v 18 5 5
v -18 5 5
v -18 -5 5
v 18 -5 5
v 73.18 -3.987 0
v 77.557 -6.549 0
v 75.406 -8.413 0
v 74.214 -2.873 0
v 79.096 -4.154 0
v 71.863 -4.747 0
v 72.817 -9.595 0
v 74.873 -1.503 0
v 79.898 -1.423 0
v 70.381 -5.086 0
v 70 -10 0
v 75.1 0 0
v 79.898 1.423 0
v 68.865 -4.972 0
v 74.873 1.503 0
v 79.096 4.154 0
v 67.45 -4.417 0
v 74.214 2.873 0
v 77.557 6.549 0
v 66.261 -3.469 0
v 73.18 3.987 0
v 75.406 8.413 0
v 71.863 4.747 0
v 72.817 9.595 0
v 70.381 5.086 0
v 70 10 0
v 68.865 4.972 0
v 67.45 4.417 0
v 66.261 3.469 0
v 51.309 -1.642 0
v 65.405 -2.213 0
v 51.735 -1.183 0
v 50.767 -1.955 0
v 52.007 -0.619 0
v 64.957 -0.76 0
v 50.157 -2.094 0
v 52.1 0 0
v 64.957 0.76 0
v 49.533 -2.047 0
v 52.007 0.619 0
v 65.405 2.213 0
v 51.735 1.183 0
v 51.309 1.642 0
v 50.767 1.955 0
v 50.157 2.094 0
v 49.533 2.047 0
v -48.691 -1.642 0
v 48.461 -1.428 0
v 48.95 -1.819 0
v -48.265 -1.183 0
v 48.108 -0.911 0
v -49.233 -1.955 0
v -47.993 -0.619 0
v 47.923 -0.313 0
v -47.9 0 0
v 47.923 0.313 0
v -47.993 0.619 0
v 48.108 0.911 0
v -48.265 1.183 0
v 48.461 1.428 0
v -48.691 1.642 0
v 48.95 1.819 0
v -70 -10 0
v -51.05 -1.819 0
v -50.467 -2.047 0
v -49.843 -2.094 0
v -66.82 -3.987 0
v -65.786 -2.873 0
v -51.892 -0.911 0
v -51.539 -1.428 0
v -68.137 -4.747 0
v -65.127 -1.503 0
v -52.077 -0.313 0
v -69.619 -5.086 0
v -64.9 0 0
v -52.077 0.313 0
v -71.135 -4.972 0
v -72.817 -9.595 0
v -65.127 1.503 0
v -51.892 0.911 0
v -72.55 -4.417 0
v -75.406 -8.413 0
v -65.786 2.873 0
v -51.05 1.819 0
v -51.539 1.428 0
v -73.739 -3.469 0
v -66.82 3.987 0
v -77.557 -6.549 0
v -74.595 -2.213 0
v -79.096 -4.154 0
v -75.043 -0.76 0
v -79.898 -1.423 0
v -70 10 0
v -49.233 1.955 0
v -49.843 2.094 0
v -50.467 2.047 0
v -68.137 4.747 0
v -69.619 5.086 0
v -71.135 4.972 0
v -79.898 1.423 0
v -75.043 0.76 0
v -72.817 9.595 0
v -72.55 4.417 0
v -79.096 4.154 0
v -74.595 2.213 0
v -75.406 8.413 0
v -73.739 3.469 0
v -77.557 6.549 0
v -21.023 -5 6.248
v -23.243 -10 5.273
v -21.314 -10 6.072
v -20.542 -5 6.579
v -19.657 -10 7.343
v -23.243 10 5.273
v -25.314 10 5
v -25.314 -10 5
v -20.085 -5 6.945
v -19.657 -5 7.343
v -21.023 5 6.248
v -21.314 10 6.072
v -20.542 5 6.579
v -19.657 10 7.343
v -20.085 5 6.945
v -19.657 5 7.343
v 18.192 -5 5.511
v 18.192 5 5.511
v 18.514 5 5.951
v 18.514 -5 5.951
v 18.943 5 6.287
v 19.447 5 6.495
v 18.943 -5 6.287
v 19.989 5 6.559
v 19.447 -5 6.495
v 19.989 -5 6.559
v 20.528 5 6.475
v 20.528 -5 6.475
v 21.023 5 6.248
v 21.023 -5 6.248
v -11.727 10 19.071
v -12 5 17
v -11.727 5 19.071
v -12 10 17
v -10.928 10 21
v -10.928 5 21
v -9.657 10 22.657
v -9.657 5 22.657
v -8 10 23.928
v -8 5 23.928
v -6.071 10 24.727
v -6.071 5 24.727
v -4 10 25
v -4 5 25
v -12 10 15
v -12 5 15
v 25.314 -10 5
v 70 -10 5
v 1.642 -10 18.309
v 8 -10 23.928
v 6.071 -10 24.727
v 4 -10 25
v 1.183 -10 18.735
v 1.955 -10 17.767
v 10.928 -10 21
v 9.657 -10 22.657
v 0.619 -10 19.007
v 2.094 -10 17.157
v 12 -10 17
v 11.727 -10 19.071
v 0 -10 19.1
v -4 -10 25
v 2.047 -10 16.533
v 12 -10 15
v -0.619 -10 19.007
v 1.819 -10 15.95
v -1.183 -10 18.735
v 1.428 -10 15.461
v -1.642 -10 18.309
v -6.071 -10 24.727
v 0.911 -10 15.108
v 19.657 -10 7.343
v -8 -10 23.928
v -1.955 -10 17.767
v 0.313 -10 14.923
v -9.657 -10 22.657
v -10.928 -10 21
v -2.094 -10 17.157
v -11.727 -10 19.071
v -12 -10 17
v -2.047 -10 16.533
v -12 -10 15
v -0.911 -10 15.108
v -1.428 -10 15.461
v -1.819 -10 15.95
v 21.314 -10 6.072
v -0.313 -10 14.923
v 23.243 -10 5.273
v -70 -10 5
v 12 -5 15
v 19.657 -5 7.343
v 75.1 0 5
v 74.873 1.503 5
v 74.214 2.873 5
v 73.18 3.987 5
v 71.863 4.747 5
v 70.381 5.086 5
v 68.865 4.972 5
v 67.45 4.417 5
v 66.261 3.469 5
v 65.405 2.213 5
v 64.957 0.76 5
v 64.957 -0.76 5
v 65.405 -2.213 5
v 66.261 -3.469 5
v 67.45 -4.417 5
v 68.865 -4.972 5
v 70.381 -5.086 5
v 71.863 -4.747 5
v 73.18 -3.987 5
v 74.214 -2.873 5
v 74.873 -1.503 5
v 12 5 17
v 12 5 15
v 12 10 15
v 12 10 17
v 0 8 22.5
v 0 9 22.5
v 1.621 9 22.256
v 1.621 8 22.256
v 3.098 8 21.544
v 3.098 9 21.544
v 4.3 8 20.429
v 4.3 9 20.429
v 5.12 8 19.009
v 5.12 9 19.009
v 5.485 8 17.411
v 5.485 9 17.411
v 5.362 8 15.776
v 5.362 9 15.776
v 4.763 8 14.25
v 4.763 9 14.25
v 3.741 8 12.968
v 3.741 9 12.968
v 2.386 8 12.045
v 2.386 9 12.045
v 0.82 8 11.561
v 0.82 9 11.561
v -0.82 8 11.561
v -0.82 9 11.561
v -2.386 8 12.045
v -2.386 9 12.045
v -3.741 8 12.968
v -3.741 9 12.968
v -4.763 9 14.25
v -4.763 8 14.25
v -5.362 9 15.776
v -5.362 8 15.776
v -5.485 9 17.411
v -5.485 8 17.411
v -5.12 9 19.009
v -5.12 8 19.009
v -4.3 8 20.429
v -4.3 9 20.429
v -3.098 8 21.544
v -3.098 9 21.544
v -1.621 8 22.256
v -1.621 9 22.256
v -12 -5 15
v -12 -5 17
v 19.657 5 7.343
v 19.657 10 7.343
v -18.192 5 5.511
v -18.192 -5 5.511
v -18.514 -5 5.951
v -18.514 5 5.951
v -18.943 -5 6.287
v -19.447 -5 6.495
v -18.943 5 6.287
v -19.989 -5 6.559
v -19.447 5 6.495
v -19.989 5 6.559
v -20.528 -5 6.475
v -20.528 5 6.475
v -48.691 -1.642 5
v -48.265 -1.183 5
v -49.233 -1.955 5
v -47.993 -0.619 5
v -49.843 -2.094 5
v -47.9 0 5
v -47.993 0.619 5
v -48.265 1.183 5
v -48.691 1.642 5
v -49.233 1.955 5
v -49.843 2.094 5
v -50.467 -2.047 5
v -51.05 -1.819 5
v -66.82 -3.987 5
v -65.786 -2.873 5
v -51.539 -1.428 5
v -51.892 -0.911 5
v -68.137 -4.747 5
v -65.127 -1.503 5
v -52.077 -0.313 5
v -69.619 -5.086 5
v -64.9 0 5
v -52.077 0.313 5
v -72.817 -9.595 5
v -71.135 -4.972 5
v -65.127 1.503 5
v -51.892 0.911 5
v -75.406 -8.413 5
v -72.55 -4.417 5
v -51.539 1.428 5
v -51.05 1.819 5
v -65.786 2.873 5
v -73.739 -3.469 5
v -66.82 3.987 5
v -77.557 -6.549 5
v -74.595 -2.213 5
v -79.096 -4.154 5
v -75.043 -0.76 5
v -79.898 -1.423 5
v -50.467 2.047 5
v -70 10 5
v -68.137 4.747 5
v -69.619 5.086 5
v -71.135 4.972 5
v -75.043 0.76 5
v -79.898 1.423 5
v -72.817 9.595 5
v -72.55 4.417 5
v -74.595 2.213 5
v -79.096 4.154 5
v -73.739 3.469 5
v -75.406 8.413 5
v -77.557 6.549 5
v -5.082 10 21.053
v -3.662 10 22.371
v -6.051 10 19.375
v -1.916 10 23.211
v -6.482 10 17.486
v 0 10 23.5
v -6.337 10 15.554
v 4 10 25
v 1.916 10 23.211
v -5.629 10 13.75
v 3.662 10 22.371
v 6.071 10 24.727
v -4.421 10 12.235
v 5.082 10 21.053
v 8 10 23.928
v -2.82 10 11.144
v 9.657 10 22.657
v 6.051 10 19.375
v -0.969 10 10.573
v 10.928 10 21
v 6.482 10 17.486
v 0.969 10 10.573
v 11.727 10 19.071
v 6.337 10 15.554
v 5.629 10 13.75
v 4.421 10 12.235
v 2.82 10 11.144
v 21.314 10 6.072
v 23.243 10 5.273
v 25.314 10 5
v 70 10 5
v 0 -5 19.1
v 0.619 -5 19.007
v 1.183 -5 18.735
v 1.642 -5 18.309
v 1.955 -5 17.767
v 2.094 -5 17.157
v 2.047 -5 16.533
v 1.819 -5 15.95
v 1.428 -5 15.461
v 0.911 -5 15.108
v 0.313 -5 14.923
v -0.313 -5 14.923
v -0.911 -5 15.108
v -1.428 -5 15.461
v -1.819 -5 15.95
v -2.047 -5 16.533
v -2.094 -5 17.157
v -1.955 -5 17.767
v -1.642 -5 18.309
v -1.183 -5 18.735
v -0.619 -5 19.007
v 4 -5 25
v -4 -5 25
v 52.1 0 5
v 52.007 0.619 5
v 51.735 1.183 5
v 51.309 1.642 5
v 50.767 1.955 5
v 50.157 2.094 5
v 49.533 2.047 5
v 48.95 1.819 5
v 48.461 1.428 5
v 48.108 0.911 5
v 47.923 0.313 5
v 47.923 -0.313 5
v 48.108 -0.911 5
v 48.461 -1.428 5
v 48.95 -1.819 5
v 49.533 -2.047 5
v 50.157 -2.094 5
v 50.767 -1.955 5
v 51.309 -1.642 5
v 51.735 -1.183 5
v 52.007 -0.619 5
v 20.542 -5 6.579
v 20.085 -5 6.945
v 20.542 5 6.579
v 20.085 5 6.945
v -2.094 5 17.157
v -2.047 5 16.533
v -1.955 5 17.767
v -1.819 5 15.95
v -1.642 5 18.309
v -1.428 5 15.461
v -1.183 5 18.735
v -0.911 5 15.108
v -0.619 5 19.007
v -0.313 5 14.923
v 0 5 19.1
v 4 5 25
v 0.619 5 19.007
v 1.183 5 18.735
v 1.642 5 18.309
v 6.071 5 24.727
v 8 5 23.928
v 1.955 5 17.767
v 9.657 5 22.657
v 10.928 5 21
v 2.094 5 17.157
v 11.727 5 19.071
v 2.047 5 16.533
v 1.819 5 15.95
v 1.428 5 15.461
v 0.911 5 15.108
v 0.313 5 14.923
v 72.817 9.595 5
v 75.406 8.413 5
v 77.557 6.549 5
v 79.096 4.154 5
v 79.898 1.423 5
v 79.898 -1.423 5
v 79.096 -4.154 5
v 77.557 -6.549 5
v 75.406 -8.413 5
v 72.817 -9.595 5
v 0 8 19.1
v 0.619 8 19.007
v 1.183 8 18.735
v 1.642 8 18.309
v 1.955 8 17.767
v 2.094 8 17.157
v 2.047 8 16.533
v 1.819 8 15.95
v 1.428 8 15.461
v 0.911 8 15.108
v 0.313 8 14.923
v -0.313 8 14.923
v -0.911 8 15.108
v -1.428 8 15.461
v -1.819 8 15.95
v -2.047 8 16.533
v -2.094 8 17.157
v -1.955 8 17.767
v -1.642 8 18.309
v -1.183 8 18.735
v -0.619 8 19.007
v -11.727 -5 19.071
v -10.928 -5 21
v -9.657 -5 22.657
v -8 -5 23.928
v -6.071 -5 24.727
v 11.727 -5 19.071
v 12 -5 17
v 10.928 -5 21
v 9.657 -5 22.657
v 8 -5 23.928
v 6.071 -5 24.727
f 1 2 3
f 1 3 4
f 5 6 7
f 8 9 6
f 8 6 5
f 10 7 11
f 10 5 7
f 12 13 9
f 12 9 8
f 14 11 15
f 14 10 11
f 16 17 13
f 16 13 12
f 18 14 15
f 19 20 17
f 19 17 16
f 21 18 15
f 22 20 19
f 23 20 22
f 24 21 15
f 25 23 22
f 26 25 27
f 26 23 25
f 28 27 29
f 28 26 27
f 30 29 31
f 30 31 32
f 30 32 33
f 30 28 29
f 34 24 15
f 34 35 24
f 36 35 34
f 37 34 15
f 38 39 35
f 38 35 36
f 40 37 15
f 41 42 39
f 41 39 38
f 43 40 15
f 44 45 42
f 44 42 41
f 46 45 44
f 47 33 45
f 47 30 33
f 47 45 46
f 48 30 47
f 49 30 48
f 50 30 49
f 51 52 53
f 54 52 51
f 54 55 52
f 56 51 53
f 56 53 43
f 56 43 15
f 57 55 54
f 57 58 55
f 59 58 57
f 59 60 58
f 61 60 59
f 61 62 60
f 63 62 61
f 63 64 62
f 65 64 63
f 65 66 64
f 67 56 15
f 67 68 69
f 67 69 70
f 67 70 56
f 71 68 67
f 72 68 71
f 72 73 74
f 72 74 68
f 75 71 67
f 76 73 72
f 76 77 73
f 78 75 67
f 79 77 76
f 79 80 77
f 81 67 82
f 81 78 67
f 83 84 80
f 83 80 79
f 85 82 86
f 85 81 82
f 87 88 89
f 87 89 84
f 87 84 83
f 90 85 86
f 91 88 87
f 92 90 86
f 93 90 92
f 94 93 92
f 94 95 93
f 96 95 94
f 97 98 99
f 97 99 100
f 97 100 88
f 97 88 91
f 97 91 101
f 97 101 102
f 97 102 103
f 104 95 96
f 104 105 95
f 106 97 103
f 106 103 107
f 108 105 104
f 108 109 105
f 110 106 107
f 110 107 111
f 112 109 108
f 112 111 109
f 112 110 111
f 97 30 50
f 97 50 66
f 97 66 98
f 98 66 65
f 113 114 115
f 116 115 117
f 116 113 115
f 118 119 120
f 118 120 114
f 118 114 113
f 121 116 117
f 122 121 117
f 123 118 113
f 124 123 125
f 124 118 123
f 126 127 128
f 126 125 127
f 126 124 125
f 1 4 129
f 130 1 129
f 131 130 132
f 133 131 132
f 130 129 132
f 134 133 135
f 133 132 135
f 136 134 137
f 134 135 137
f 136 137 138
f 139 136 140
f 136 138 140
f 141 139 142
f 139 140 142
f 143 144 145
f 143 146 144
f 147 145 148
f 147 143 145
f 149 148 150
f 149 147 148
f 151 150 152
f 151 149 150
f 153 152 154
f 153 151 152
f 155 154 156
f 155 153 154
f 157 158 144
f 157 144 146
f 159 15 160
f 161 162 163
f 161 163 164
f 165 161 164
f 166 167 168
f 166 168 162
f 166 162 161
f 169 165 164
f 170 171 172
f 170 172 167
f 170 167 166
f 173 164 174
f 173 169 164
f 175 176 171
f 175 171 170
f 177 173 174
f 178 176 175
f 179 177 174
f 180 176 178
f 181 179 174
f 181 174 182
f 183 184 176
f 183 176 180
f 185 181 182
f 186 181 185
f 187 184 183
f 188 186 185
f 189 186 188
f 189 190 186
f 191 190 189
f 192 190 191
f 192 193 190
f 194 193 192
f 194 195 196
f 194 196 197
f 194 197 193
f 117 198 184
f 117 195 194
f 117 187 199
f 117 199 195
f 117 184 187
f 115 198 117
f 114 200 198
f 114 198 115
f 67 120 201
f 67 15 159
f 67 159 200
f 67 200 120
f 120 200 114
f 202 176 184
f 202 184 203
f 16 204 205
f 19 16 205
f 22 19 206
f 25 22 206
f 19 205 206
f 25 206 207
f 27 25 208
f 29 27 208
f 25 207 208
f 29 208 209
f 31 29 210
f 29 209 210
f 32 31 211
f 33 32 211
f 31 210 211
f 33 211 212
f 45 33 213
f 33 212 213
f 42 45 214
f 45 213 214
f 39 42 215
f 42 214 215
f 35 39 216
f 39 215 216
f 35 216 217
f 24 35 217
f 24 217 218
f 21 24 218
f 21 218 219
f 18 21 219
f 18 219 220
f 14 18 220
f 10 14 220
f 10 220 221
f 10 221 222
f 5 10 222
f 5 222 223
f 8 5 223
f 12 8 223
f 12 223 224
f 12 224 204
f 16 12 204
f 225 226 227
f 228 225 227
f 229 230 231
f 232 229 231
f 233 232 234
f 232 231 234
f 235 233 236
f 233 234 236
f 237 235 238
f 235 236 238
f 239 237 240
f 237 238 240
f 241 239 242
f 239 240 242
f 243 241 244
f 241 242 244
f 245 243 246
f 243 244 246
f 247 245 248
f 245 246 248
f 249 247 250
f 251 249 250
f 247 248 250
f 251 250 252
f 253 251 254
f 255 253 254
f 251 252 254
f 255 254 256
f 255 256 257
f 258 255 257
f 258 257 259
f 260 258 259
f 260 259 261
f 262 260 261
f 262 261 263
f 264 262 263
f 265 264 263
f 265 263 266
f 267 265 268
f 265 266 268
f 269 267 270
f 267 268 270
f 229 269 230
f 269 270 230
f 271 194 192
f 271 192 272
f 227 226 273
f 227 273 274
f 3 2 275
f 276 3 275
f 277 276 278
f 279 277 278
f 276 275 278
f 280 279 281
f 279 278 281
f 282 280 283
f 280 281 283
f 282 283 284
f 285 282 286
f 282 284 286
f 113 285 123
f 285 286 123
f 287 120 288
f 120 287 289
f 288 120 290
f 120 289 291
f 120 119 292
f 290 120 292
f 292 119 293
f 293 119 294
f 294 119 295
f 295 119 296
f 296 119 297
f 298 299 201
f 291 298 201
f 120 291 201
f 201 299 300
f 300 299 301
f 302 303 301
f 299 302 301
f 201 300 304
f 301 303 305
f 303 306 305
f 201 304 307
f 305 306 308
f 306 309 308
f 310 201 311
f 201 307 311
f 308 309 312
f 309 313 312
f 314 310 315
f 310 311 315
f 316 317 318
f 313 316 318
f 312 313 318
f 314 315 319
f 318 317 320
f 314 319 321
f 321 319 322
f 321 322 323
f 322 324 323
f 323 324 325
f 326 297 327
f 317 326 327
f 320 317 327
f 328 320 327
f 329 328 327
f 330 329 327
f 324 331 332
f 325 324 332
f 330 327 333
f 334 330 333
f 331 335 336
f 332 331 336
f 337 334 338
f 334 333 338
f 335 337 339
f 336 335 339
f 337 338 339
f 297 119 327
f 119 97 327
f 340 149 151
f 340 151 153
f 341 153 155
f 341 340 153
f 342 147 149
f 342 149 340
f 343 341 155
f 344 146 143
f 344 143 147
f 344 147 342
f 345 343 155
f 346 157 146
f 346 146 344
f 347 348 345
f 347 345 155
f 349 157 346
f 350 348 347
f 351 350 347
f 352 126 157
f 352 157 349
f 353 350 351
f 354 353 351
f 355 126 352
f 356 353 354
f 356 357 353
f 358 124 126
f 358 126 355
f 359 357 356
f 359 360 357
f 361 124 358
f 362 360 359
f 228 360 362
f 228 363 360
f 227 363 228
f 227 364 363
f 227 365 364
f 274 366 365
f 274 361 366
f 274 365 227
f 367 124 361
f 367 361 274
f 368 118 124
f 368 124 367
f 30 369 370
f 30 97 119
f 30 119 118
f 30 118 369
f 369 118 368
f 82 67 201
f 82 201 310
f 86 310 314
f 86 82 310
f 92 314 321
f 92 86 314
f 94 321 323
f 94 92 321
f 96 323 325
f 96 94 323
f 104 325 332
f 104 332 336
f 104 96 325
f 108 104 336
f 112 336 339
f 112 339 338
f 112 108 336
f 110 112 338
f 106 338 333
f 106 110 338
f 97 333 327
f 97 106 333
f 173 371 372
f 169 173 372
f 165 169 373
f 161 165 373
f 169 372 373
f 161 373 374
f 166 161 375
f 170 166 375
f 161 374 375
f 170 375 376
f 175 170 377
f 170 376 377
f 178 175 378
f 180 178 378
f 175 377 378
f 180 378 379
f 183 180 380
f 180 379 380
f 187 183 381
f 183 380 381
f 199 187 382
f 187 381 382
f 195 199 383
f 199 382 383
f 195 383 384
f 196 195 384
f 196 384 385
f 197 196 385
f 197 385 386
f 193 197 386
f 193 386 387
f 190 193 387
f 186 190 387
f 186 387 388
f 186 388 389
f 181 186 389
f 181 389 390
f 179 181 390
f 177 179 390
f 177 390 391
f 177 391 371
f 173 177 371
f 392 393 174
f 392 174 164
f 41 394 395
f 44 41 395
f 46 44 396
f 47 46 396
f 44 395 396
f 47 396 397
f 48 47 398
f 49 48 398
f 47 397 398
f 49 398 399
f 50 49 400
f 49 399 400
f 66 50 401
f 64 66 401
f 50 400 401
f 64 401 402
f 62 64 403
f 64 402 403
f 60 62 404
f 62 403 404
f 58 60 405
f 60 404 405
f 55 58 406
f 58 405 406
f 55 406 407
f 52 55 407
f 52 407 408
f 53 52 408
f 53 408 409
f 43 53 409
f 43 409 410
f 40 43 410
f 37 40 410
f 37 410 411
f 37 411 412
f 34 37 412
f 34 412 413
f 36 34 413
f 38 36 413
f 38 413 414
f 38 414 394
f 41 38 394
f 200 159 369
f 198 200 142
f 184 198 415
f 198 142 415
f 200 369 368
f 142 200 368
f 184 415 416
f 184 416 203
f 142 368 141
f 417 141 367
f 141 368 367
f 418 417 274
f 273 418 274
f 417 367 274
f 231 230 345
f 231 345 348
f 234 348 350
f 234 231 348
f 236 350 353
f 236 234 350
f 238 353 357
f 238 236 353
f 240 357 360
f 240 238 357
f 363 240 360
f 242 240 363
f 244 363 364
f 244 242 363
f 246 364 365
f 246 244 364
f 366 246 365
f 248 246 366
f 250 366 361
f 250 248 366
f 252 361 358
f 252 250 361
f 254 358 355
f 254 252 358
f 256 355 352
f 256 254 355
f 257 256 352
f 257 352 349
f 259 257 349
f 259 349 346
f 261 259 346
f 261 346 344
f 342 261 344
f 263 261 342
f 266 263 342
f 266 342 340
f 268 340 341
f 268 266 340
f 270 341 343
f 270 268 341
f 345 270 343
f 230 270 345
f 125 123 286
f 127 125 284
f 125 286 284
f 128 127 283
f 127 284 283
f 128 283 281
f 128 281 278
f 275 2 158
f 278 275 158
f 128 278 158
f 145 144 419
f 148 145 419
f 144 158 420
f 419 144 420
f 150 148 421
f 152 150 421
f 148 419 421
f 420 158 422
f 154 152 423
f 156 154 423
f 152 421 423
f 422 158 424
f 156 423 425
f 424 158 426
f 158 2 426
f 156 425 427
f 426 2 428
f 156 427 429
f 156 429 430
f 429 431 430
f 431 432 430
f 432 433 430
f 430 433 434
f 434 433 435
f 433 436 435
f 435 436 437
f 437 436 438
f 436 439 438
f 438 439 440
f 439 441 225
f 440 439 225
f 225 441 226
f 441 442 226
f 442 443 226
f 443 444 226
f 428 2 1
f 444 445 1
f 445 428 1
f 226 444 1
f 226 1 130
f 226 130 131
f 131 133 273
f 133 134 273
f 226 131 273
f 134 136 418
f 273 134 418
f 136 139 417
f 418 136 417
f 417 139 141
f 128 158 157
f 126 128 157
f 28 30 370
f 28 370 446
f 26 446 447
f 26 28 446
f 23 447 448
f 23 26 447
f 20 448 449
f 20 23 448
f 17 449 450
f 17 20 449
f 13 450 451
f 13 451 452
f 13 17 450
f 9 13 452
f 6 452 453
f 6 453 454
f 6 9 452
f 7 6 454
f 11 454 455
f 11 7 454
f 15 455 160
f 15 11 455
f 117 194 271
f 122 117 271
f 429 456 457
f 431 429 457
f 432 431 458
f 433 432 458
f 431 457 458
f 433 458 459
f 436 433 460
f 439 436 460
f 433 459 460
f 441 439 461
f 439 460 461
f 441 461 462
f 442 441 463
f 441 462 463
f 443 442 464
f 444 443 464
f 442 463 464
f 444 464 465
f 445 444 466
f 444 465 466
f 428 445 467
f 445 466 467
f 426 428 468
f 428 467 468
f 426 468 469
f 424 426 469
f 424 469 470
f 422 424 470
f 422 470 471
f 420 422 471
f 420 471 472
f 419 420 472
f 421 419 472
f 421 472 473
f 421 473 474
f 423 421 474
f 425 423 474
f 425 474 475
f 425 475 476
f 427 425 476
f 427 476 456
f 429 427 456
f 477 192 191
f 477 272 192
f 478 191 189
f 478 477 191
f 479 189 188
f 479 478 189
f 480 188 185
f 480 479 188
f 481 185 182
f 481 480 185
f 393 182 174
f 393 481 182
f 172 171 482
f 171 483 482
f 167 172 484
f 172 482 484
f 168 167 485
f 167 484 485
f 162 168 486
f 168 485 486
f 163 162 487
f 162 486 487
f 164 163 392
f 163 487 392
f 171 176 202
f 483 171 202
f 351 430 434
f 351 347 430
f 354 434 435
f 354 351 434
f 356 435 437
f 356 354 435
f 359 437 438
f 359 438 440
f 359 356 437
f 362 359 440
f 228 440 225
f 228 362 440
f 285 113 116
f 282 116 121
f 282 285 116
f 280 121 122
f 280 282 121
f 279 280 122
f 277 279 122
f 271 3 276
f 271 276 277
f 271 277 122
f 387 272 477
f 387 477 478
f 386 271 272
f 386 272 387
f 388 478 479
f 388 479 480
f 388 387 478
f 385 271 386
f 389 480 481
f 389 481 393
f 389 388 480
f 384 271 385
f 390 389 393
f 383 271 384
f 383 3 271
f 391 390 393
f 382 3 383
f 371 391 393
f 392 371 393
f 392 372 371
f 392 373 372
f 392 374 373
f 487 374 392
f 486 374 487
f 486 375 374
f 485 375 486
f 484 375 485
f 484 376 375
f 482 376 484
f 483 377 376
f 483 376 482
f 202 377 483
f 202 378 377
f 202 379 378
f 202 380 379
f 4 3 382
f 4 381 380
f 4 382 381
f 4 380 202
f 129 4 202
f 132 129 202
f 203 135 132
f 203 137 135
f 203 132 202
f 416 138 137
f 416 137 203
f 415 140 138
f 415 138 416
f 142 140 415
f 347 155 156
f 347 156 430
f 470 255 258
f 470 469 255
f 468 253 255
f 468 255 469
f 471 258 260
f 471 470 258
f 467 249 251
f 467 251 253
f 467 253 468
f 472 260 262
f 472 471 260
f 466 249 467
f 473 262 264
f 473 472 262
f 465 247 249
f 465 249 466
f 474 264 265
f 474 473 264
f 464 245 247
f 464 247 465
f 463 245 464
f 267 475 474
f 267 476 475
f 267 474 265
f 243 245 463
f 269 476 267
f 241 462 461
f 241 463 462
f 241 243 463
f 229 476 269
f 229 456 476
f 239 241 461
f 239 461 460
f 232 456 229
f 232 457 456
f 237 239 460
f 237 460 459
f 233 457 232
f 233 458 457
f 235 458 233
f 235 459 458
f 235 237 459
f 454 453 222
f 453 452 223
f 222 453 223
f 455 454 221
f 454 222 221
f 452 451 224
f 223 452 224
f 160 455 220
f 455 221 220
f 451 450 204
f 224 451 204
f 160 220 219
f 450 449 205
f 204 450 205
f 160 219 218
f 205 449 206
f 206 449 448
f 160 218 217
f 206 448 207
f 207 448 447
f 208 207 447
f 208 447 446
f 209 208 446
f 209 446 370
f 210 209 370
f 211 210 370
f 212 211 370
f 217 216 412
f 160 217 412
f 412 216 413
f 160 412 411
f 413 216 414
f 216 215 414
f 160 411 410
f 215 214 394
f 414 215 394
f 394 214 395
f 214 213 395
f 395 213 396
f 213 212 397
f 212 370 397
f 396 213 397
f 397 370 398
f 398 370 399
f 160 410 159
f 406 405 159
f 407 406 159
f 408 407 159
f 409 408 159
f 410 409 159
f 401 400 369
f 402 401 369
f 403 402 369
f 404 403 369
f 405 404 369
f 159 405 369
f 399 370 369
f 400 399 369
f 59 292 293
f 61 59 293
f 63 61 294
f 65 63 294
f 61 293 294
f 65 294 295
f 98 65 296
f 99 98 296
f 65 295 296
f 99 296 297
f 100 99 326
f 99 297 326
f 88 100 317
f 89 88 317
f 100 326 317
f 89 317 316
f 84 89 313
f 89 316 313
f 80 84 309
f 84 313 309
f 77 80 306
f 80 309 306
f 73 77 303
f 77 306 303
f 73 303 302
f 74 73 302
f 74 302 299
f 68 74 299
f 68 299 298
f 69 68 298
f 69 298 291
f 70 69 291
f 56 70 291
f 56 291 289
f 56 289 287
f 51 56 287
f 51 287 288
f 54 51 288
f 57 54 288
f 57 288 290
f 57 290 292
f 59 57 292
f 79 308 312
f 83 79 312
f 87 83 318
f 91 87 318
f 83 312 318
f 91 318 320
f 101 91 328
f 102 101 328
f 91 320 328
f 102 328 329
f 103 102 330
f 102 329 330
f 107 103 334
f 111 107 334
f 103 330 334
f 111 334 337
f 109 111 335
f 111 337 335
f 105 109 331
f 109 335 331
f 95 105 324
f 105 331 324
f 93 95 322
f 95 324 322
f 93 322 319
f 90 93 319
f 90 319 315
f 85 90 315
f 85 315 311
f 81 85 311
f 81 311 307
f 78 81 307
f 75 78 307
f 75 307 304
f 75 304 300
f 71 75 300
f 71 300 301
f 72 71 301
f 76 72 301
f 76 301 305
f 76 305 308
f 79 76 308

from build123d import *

# Parameters (mm, degrees)
BOSS_EXTRU_1_DEPTH      = 5
ESQUISSE2_R             = 5.1
ESQUISSE2_R_2           = 2.1
ENL_V_MAT_EXTRU_1_DEPTH = 81.777472107
ESQUISSE3_W             = 24
ESQUISSE3_H             = 20
BOSS_EXTRU_2_DEPTH      = 20
CHANFREIN1_SIZE         = 10
ESQUISSE4_W             = 36
ESQUISSE4_H             = 10
ENL_V_MAT_EXTRU_2_DEPTH = 20
ESQUISSE5_R             = 2.1
ENL_V_MAT_EXTRU_3_DEPTH = 87.168439698
CONG_1_R                = 8
ESQUISSE6_R             = 5.5
ENL_V_MAT_EXTRU_4_DEPTH = 2
CHANFREIN2_SIZE         = 1
CONG_4_R                = 2


with BuildPart() as part:
    # Esquisse1 → Boss.-Extru.1 (new body)
    with BuildSketch(Plane.XY):
        with BuildLine():
            Line((-70, 10), (70, 10))
            ThreePointArc((70, 10), (80, 0), (70, -10))
            Line((70, -10), (-70, -10))
            ThreePointArc((-70, -10), (-80, 0), (-70, 10))
        make_face()
    extrude(amount=BOSS_EXTRU_1_DEPTH)

    # Esquisse2 → Enlèv. mat.-Extru.1 (cut, through all)
    with BuildSketch(Plane.XY.offset(5)):
        with Locations((-70, 0)):
            Circle(ESQUISSE2_R)
        with Locations((70, 0)):
            Circle(ESQUISSE2_R)
        with Locations((-50, 0)):
            Circle(ESQUISSE2_R_2)
        with Locations((50, 0)):
            Circle(ESQUISSE2_R_2)
    extrude(amount=-ENL_V_MAT_EXTRU_1_DEPTH, mode=Mode.SUBTRACT)

    # Esquisse3 → Boss.-Extru.2 (add)
    with BuildSketch(Plane.XY.offset(5)):
        Rectangle(ESQUISSE3_W, ESQUISSE3_H)
    extrude(amount=BOSS_EXTRU_2_DEPTH)

    # Chanfrein1
    chanfrein1_edges = [part.edges().sort_by_distance(p)[0] for p in [
        (12, 0, 5),
        (-12, 0, 5),
    ]]
    chamfer(chanfrein1_edges, length=CHANFREIN1_SIZE)

    # Esquisse4 → Enlèv. mat.-Extru.2 (cut)
    with BuildSketch(Plane.XY.offset(25)):
        Rectangle(ESQUISSE4_W, ESQUISSE4_H)
    extrude(amount=-ENL_V_MAT_EXTRU_2_DEPTH, mode=Mode.SUBTRACT)

    # Esquisse5 → Enlèv. mat.-Extru.3 (cut, through all)
    with BuildSketch(Plane(origin=(0, 10, 0), x_dir=(1, 0, 0), z_dir=(0, 1, 0))):
        with Locations(Location((0, -17, 0), (0, 0, 270))):
            Circle(ESQUISSE5_R)
    extrude(amount=-ENL_V_MAT_EXTRU_3_DEPTH, mode=Mode.SUBTRACT)

    # Congé1
    cong_1_edges = [part.edges().sort_by_distance(p)[0] for p in [
        (-22, 0, 5),
        (-12, -7.5, 25),
        (12, -7.5, 25),
        (22, 0, 5),
        (-12, 7.5, 25),
        (12, 7.5, 25),
    ]]
    fillet(cong_1_edges, radius=CONG_1_R)

    # Esquisse6 → Enlèv. mat.-Extru.4 (cut)
    with BuildSketch(Plane(origin=(0, 10, 0), x_dir=(1, 0, 0), z_dir=(0, 1, 0))):
        with Locations(Location((0, -17, 0), (0, 0, 270))):
            Circle(ESQUISSE6_R)
    extrude(amount=-ENL_V_MAT_EXTRU_4_DEPTH, mode=Mode.SUBTRACT)

    # Chanfrein2
    chanfrein2_edges = [part.edges().sort_by_distance(p)[0] for p in [
        (0, 10, 11.5),
    ]]
    chamfer(chanfrein2_edges, length=CHANFREIN2_SIZE)

    # Congé4
    # the kernel refuses this fillet: 2 mm, written as the material it takes off along each edge
    with BuildSketch(Plane(origin=(18, -5, 9), x_dir=(0.7394878589424565, 0, -0.6731698942144558), z_dir=(0, 1, 0)), Plane(origin=(-18, 5, 9), x_dir=(-0.7394878589424565, 0, -0.6731698942144557), z_dir=(0, -1, 0))) as cong_4_piece_1:
        with BuildLine():
            CenterArc((4.431818389, 1.970329953), CONG_4_R, 150.40864019, 109.709922664)
            Line((2.692679577, 2.957951436), (2.518765696, 3.056713584))
            ThreePointArc((2.518765696, 3.056713584), (1.198442217, 1.613609697), (-0.147897572, 0.134633979))
            Line((-0.147897572, 0.134633979), (0.009378777, -0.199779975))
            ThreePointArc((0.009378777, -0.199779975), (2.349946778, -0.089900774), (4.054276537, -0.197032995))
            Line((4.054276537, -0.197032995), (4.088598523, 0))
        make_face()
    extrude(amount=10, mode=Mode.SUBTRACT)


solid = part.part
